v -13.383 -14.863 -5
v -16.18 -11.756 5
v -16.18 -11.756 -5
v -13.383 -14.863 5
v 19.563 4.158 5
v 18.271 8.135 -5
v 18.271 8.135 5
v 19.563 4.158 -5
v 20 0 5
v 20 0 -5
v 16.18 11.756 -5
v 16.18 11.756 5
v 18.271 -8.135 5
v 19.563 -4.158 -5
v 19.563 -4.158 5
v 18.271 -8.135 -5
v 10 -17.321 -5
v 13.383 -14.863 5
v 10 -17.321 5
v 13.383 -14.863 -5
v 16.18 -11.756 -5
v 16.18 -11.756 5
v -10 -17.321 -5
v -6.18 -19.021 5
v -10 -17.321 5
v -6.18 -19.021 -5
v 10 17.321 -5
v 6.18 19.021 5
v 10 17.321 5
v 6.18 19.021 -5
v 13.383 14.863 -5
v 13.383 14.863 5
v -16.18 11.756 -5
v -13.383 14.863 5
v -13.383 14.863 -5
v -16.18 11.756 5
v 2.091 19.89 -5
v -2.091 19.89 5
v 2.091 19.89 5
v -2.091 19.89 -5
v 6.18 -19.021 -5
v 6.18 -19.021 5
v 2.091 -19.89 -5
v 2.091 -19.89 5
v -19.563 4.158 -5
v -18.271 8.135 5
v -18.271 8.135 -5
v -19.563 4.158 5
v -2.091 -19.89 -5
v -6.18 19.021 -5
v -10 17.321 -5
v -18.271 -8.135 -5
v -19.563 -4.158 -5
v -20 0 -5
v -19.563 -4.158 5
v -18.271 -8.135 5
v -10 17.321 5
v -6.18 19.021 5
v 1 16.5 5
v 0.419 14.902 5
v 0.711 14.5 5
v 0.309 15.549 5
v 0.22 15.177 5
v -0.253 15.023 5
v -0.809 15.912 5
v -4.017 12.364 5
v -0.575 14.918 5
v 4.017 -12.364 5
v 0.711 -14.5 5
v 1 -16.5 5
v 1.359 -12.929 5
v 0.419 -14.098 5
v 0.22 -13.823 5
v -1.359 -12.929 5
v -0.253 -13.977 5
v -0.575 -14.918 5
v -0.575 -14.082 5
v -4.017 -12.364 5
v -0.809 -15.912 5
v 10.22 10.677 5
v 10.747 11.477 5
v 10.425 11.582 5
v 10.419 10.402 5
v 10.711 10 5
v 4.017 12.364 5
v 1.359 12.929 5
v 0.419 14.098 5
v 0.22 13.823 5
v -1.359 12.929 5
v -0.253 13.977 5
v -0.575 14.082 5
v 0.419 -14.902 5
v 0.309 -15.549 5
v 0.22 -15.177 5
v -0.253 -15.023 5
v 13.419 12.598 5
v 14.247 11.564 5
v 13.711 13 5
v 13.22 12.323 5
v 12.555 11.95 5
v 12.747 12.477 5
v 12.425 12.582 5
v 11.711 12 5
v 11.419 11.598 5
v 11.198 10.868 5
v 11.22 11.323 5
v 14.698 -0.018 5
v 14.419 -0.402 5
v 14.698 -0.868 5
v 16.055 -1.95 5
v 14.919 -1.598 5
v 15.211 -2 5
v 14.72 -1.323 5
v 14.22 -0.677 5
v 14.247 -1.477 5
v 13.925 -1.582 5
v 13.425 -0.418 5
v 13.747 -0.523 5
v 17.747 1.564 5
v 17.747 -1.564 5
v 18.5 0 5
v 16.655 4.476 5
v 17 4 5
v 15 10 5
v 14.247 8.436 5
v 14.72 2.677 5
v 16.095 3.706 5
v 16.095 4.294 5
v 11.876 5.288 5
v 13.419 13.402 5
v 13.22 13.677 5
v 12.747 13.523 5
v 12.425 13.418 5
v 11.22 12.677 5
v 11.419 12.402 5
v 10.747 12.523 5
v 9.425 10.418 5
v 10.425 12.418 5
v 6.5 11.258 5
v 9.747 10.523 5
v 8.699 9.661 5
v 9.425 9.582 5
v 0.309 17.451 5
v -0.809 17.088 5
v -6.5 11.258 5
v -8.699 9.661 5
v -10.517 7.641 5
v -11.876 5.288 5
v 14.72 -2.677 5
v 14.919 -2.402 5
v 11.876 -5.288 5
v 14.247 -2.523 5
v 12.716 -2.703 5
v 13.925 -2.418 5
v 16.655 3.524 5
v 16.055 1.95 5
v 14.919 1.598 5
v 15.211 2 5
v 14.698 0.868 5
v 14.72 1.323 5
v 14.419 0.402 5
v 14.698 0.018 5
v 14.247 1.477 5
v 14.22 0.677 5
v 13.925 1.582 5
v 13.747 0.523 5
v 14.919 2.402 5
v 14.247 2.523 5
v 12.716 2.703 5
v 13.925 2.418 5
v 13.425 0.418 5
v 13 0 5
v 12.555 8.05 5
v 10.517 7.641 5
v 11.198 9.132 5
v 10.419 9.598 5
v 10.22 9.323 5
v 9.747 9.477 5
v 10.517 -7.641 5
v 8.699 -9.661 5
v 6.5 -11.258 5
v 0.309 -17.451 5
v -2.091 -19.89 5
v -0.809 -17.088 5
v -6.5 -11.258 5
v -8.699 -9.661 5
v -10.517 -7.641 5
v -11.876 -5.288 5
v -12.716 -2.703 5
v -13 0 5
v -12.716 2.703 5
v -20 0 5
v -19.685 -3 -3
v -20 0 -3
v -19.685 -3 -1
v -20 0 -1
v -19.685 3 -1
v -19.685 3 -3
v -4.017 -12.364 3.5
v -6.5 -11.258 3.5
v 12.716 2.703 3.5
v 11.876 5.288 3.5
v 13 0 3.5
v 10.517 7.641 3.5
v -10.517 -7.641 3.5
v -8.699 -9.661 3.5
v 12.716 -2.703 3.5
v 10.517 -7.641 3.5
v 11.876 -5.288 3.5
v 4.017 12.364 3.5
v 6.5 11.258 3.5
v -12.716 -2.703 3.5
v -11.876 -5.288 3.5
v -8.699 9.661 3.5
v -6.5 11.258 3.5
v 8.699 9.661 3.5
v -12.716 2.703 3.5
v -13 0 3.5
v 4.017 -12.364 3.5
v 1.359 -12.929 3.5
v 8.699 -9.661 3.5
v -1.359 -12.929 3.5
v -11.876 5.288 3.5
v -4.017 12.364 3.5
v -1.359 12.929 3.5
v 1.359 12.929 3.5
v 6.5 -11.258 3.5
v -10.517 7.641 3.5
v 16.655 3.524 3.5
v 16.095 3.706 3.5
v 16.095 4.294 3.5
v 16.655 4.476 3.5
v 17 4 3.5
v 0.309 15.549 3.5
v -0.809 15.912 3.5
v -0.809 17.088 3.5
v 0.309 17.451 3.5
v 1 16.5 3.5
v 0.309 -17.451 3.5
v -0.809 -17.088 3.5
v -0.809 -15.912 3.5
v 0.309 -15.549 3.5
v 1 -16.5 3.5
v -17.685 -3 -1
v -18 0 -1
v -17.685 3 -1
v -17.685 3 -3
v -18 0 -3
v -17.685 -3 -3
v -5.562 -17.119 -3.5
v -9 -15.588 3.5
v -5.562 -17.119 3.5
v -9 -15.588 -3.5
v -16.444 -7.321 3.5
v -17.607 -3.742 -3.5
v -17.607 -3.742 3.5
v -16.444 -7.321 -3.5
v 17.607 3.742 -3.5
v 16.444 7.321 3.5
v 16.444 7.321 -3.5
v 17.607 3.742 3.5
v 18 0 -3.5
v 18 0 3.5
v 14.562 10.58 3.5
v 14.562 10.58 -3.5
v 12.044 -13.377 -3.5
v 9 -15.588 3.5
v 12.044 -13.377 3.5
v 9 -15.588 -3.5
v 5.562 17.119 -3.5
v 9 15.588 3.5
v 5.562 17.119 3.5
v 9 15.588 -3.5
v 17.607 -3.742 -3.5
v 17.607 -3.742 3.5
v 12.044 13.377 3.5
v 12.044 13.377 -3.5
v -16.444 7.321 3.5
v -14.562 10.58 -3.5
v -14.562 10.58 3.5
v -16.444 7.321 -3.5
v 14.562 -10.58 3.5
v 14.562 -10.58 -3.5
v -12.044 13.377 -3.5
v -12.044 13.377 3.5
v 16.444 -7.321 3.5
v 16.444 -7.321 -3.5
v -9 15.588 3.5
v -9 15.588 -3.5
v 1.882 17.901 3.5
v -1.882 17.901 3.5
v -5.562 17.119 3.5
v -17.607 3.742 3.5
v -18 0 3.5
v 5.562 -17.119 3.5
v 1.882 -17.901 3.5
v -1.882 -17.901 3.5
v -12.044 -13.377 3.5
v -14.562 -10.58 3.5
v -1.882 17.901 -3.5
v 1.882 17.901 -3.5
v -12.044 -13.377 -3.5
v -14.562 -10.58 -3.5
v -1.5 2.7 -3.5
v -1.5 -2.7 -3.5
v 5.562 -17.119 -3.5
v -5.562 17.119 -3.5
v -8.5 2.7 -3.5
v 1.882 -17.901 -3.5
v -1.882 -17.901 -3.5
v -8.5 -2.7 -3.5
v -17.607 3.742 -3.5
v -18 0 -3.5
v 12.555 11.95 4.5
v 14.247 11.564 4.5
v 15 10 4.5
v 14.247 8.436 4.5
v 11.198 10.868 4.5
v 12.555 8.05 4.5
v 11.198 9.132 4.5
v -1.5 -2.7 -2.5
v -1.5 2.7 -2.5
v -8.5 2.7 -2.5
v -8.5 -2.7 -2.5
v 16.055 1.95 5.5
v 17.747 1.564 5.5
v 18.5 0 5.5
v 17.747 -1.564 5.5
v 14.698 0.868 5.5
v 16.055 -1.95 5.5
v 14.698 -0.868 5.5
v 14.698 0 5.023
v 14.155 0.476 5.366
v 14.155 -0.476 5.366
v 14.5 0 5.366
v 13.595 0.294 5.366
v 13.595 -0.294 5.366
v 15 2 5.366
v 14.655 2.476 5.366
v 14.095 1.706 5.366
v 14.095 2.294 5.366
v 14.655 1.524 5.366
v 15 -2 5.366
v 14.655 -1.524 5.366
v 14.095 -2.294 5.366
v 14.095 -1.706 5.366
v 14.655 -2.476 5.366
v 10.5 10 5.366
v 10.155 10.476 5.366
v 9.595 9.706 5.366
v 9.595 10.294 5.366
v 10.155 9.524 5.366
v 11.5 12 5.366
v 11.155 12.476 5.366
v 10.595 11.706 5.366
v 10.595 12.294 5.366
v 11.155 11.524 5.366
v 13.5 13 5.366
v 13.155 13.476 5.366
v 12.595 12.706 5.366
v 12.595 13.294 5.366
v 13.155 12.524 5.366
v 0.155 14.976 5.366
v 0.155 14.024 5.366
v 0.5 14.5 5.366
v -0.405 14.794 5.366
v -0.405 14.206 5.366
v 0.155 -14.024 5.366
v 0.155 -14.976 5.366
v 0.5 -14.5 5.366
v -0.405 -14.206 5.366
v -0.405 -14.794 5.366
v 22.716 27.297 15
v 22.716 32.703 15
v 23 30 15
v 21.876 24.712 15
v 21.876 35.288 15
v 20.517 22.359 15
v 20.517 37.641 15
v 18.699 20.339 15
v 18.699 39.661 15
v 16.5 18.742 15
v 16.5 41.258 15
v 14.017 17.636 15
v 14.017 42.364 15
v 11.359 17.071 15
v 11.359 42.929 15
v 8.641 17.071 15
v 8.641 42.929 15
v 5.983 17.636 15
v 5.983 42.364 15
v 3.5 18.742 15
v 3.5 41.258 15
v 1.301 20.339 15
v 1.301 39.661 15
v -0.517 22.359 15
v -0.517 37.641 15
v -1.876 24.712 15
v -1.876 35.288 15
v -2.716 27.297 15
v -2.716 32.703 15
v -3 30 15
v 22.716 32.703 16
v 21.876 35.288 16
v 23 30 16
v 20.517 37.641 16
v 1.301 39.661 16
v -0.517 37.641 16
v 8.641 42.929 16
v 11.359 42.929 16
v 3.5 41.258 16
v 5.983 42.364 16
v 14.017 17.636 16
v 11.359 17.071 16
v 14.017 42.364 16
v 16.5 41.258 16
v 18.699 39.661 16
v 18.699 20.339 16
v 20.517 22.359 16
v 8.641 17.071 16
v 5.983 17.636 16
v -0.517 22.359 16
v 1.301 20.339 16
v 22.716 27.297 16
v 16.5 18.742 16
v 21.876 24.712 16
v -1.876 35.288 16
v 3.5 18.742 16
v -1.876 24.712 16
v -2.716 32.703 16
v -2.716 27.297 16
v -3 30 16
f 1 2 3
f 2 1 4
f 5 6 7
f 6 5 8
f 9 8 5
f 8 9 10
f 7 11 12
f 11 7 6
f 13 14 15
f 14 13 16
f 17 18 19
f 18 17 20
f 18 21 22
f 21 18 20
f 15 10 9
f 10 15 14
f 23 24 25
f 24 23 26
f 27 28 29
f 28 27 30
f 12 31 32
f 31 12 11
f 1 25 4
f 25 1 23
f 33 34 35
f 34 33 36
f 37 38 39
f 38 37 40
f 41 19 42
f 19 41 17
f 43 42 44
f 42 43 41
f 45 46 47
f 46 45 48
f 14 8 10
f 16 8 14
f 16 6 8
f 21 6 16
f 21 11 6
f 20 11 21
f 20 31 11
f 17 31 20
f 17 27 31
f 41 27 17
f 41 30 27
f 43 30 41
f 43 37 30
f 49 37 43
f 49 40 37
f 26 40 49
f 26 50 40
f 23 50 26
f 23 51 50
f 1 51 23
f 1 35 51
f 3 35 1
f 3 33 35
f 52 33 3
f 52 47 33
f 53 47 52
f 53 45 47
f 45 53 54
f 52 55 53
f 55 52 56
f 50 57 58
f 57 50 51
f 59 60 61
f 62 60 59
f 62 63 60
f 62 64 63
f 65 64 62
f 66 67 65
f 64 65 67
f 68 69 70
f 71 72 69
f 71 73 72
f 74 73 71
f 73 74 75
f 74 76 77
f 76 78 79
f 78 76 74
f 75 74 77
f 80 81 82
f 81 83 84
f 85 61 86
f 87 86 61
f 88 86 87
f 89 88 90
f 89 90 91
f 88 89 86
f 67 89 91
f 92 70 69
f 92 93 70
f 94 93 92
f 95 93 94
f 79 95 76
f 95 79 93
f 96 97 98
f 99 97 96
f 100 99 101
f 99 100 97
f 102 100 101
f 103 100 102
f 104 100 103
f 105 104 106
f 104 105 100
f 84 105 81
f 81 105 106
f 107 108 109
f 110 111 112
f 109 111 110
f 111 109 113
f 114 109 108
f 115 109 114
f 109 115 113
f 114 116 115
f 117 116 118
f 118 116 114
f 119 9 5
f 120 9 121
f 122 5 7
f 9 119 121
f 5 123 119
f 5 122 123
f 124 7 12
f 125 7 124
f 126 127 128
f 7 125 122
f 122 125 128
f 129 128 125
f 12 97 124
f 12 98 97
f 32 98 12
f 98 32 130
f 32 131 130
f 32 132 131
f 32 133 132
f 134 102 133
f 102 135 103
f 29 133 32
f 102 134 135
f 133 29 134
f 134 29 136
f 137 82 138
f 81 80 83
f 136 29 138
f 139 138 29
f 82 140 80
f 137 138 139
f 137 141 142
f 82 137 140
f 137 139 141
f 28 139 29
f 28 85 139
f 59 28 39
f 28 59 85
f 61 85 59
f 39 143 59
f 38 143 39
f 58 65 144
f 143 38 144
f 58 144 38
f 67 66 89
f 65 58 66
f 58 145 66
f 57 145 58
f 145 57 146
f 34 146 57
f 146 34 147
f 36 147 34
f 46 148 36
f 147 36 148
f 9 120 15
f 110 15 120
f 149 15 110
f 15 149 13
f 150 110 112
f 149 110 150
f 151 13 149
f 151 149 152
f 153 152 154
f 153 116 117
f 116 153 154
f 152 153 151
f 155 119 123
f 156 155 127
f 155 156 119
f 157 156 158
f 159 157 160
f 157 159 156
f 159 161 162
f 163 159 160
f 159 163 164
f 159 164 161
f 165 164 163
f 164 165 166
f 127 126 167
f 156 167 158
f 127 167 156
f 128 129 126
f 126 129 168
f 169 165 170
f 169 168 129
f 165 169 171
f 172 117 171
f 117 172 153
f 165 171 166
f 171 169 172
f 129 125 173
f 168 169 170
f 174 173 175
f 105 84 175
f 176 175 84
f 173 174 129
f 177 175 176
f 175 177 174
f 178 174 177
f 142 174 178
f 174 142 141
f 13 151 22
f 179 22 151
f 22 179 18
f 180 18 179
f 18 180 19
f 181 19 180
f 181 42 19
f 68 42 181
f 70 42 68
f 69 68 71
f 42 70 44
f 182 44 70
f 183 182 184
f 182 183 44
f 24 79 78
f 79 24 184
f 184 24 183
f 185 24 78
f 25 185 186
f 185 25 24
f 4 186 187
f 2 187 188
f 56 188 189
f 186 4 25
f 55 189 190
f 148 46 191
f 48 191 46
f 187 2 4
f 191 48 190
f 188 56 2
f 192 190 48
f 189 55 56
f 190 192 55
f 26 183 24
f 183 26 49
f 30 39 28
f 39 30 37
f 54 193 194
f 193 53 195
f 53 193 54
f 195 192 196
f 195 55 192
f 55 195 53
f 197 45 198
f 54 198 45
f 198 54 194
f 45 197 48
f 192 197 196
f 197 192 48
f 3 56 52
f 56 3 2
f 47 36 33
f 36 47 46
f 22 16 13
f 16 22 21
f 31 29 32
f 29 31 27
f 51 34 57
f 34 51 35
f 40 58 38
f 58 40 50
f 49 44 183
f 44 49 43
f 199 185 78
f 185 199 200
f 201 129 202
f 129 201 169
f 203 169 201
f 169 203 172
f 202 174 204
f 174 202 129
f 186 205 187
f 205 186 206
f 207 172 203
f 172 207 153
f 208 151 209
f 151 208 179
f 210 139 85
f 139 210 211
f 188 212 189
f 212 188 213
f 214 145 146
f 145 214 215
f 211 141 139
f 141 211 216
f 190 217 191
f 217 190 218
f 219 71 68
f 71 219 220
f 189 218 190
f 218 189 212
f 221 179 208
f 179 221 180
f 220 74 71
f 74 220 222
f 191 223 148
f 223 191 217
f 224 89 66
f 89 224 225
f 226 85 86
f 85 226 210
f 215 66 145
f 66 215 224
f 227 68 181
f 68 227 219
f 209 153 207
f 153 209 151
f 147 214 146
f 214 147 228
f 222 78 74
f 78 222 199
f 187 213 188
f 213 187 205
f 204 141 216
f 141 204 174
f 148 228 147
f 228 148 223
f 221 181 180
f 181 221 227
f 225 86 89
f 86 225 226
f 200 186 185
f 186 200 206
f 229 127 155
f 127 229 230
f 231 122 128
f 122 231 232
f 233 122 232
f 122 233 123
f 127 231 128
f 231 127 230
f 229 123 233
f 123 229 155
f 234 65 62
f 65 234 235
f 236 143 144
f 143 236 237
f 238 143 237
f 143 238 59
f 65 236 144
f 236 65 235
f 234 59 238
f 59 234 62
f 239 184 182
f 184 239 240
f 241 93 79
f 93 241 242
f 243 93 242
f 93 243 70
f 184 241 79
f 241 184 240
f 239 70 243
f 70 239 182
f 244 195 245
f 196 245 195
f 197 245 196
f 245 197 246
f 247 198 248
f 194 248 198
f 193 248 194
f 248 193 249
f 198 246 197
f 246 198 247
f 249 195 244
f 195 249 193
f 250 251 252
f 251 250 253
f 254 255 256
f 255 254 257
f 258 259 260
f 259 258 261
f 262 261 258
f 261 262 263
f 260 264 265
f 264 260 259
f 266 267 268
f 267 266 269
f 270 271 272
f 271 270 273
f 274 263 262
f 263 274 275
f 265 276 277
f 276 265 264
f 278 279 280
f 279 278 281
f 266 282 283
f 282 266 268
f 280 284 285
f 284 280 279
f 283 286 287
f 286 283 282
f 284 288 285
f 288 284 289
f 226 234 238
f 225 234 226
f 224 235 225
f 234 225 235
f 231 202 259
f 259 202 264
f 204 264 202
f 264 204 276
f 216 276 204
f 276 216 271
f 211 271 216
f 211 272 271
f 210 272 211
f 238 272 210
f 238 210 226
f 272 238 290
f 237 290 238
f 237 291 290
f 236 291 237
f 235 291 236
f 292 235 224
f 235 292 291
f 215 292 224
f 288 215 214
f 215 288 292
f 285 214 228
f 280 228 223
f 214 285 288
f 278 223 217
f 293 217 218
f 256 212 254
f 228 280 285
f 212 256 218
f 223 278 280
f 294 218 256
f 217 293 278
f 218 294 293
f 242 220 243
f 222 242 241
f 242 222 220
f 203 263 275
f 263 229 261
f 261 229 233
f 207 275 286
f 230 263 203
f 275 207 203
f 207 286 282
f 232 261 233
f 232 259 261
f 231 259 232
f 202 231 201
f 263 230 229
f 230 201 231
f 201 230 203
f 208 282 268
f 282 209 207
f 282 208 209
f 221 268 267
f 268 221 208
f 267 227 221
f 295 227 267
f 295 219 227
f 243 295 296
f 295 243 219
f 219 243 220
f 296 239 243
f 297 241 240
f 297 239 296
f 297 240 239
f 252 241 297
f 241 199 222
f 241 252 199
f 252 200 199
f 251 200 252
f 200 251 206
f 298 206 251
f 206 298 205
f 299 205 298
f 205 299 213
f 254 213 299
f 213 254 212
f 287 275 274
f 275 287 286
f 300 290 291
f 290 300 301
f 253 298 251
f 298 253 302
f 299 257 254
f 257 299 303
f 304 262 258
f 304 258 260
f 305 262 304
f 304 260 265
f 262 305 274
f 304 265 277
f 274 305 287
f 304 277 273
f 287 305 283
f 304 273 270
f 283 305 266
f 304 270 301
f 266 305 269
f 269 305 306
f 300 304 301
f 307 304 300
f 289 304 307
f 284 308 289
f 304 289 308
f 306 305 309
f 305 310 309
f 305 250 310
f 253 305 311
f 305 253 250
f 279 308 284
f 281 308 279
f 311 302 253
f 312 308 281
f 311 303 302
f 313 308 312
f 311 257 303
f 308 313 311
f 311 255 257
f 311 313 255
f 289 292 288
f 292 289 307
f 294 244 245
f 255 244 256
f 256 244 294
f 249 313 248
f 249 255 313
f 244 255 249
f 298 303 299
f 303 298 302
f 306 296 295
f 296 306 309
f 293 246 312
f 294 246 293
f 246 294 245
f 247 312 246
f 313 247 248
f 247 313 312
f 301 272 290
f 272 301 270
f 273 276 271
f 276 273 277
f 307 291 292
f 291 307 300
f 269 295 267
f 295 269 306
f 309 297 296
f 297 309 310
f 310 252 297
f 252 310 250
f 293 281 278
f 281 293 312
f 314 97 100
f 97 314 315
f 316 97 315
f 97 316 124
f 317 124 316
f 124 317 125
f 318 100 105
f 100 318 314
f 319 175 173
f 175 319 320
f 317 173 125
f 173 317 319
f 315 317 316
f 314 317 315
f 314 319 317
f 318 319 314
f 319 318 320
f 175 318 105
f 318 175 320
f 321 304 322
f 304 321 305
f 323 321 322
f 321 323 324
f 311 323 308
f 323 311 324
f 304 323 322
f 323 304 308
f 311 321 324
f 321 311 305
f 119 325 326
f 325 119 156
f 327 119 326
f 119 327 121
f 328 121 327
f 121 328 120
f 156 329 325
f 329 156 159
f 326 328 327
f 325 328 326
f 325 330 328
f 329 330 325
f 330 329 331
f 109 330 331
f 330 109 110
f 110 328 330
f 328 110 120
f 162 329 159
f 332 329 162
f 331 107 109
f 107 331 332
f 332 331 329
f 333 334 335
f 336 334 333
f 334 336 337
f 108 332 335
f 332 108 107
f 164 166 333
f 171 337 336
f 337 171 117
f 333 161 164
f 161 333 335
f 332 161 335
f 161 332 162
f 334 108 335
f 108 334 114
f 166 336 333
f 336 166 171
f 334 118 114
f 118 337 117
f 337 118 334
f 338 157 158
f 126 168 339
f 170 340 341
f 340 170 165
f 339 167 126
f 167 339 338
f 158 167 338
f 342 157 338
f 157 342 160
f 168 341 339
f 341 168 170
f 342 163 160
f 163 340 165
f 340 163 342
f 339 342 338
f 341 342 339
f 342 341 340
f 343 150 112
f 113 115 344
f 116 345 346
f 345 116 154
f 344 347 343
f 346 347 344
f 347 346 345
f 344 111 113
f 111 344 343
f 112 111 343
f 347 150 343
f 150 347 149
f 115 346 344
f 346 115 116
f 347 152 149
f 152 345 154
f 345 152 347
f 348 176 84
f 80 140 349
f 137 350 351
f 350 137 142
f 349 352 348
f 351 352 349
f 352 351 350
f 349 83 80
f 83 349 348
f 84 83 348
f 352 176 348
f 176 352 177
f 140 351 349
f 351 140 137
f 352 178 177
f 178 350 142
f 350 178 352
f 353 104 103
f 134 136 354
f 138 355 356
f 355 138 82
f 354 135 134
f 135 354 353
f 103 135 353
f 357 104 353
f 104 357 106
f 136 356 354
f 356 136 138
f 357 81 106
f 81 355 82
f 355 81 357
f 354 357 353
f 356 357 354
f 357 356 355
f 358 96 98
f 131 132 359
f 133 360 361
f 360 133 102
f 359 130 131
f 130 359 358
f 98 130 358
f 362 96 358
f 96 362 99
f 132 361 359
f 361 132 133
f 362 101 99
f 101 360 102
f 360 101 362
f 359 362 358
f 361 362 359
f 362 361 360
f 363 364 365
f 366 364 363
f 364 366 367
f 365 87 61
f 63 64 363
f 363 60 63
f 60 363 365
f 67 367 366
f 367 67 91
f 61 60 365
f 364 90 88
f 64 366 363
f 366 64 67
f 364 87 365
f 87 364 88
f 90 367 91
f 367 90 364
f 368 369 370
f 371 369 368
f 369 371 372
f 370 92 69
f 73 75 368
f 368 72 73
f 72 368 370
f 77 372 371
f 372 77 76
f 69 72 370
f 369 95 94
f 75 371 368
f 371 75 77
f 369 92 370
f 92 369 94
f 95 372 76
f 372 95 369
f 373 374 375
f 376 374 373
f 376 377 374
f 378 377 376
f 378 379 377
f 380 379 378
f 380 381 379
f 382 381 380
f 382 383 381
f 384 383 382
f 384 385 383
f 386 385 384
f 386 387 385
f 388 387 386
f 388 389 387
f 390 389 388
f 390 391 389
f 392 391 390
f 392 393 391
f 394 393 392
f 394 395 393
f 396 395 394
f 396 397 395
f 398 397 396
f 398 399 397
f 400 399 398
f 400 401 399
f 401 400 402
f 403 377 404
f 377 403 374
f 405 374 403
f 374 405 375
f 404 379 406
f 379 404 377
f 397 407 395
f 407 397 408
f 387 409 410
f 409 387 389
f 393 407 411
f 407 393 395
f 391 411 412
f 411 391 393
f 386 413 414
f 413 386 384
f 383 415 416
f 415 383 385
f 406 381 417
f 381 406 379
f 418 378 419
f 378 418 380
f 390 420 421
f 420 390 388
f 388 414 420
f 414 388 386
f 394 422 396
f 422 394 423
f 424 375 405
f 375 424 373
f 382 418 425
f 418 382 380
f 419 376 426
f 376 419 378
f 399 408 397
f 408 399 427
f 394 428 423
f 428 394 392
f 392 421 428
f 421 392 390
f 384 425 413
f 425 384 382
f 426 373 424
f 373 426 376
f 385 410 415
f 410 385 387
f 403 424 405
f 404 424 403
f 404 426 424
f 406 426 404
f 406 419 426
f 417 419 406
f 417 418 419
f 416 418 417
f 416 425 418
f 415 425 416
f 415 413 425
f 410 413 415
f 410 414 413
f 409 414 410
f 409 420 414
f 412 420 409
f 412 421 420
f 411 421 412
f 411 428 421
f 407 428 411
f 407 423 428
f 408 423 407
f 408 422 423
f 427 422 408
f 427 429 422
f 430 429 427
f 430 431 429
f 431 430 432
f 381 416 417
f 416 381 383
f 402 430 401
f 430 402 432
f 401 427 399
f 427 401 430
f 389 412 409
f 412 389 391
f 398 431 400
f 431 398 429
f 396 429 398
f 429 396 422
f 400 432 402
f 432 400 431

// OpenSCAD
    difference() {
    //Hauptzylinder
    cylinder(h=10, r=20, center=true);
    // Ausbuchtung Waage Element
    translate([0,0,4.9])cylinder(h=3, r=13, center=true);
    // Mikroloch
    translate([16.5,4,5])cylinder(h=5, r=0.5, center=true);
    // Lautsprecher 1 Loch
    translate([0,16.5,5])cylinder(h=5, r=1, center=true);
    // Lautsprecher 2 Loch
    translate([0,-16.5,5])cylinder(h=5, r=1, center=true);
    // Ausbuchtung USB
    translate([-16.5,0,-2])cube([8,6,2], center=true);
    // Innen hohl
    cylinder(h=7, r=18, center=true);
    // Herzfrequenzmesser
    translate([13,10,5])cylinder(h=1, r=2, center=true);
}

// Arduino
translate([-5,0,-3])cube([7,5.4,1], center=true);

// Knopf
translate([16.5,0,5])cylinder(h=1, r=2, center=true);

//Diode Knopf
color("red")translate([14,0,4.5]) sphere(1);
color("red")translate([14.5,2,4.5]) sphere(1);
color("red")translate([14.5,-2,4.5]) sphere(1);

//Diode Heartbeat
color("blue")translate([10,10,4.5]) sphere(1);
color("blue")translate([11,12,4.5]) sphere(1);
color("blue")translate([13,13,4.5]) sphere(1);

//Diode Waage
color("green")translate([0,14.5,4.5]) sphere(1);
color("green")translate([0,-14.5,4.5]) sphere(1);




// "Waage" oberes Element
translate([10,30,15])cylinder(h=1, r=13);
